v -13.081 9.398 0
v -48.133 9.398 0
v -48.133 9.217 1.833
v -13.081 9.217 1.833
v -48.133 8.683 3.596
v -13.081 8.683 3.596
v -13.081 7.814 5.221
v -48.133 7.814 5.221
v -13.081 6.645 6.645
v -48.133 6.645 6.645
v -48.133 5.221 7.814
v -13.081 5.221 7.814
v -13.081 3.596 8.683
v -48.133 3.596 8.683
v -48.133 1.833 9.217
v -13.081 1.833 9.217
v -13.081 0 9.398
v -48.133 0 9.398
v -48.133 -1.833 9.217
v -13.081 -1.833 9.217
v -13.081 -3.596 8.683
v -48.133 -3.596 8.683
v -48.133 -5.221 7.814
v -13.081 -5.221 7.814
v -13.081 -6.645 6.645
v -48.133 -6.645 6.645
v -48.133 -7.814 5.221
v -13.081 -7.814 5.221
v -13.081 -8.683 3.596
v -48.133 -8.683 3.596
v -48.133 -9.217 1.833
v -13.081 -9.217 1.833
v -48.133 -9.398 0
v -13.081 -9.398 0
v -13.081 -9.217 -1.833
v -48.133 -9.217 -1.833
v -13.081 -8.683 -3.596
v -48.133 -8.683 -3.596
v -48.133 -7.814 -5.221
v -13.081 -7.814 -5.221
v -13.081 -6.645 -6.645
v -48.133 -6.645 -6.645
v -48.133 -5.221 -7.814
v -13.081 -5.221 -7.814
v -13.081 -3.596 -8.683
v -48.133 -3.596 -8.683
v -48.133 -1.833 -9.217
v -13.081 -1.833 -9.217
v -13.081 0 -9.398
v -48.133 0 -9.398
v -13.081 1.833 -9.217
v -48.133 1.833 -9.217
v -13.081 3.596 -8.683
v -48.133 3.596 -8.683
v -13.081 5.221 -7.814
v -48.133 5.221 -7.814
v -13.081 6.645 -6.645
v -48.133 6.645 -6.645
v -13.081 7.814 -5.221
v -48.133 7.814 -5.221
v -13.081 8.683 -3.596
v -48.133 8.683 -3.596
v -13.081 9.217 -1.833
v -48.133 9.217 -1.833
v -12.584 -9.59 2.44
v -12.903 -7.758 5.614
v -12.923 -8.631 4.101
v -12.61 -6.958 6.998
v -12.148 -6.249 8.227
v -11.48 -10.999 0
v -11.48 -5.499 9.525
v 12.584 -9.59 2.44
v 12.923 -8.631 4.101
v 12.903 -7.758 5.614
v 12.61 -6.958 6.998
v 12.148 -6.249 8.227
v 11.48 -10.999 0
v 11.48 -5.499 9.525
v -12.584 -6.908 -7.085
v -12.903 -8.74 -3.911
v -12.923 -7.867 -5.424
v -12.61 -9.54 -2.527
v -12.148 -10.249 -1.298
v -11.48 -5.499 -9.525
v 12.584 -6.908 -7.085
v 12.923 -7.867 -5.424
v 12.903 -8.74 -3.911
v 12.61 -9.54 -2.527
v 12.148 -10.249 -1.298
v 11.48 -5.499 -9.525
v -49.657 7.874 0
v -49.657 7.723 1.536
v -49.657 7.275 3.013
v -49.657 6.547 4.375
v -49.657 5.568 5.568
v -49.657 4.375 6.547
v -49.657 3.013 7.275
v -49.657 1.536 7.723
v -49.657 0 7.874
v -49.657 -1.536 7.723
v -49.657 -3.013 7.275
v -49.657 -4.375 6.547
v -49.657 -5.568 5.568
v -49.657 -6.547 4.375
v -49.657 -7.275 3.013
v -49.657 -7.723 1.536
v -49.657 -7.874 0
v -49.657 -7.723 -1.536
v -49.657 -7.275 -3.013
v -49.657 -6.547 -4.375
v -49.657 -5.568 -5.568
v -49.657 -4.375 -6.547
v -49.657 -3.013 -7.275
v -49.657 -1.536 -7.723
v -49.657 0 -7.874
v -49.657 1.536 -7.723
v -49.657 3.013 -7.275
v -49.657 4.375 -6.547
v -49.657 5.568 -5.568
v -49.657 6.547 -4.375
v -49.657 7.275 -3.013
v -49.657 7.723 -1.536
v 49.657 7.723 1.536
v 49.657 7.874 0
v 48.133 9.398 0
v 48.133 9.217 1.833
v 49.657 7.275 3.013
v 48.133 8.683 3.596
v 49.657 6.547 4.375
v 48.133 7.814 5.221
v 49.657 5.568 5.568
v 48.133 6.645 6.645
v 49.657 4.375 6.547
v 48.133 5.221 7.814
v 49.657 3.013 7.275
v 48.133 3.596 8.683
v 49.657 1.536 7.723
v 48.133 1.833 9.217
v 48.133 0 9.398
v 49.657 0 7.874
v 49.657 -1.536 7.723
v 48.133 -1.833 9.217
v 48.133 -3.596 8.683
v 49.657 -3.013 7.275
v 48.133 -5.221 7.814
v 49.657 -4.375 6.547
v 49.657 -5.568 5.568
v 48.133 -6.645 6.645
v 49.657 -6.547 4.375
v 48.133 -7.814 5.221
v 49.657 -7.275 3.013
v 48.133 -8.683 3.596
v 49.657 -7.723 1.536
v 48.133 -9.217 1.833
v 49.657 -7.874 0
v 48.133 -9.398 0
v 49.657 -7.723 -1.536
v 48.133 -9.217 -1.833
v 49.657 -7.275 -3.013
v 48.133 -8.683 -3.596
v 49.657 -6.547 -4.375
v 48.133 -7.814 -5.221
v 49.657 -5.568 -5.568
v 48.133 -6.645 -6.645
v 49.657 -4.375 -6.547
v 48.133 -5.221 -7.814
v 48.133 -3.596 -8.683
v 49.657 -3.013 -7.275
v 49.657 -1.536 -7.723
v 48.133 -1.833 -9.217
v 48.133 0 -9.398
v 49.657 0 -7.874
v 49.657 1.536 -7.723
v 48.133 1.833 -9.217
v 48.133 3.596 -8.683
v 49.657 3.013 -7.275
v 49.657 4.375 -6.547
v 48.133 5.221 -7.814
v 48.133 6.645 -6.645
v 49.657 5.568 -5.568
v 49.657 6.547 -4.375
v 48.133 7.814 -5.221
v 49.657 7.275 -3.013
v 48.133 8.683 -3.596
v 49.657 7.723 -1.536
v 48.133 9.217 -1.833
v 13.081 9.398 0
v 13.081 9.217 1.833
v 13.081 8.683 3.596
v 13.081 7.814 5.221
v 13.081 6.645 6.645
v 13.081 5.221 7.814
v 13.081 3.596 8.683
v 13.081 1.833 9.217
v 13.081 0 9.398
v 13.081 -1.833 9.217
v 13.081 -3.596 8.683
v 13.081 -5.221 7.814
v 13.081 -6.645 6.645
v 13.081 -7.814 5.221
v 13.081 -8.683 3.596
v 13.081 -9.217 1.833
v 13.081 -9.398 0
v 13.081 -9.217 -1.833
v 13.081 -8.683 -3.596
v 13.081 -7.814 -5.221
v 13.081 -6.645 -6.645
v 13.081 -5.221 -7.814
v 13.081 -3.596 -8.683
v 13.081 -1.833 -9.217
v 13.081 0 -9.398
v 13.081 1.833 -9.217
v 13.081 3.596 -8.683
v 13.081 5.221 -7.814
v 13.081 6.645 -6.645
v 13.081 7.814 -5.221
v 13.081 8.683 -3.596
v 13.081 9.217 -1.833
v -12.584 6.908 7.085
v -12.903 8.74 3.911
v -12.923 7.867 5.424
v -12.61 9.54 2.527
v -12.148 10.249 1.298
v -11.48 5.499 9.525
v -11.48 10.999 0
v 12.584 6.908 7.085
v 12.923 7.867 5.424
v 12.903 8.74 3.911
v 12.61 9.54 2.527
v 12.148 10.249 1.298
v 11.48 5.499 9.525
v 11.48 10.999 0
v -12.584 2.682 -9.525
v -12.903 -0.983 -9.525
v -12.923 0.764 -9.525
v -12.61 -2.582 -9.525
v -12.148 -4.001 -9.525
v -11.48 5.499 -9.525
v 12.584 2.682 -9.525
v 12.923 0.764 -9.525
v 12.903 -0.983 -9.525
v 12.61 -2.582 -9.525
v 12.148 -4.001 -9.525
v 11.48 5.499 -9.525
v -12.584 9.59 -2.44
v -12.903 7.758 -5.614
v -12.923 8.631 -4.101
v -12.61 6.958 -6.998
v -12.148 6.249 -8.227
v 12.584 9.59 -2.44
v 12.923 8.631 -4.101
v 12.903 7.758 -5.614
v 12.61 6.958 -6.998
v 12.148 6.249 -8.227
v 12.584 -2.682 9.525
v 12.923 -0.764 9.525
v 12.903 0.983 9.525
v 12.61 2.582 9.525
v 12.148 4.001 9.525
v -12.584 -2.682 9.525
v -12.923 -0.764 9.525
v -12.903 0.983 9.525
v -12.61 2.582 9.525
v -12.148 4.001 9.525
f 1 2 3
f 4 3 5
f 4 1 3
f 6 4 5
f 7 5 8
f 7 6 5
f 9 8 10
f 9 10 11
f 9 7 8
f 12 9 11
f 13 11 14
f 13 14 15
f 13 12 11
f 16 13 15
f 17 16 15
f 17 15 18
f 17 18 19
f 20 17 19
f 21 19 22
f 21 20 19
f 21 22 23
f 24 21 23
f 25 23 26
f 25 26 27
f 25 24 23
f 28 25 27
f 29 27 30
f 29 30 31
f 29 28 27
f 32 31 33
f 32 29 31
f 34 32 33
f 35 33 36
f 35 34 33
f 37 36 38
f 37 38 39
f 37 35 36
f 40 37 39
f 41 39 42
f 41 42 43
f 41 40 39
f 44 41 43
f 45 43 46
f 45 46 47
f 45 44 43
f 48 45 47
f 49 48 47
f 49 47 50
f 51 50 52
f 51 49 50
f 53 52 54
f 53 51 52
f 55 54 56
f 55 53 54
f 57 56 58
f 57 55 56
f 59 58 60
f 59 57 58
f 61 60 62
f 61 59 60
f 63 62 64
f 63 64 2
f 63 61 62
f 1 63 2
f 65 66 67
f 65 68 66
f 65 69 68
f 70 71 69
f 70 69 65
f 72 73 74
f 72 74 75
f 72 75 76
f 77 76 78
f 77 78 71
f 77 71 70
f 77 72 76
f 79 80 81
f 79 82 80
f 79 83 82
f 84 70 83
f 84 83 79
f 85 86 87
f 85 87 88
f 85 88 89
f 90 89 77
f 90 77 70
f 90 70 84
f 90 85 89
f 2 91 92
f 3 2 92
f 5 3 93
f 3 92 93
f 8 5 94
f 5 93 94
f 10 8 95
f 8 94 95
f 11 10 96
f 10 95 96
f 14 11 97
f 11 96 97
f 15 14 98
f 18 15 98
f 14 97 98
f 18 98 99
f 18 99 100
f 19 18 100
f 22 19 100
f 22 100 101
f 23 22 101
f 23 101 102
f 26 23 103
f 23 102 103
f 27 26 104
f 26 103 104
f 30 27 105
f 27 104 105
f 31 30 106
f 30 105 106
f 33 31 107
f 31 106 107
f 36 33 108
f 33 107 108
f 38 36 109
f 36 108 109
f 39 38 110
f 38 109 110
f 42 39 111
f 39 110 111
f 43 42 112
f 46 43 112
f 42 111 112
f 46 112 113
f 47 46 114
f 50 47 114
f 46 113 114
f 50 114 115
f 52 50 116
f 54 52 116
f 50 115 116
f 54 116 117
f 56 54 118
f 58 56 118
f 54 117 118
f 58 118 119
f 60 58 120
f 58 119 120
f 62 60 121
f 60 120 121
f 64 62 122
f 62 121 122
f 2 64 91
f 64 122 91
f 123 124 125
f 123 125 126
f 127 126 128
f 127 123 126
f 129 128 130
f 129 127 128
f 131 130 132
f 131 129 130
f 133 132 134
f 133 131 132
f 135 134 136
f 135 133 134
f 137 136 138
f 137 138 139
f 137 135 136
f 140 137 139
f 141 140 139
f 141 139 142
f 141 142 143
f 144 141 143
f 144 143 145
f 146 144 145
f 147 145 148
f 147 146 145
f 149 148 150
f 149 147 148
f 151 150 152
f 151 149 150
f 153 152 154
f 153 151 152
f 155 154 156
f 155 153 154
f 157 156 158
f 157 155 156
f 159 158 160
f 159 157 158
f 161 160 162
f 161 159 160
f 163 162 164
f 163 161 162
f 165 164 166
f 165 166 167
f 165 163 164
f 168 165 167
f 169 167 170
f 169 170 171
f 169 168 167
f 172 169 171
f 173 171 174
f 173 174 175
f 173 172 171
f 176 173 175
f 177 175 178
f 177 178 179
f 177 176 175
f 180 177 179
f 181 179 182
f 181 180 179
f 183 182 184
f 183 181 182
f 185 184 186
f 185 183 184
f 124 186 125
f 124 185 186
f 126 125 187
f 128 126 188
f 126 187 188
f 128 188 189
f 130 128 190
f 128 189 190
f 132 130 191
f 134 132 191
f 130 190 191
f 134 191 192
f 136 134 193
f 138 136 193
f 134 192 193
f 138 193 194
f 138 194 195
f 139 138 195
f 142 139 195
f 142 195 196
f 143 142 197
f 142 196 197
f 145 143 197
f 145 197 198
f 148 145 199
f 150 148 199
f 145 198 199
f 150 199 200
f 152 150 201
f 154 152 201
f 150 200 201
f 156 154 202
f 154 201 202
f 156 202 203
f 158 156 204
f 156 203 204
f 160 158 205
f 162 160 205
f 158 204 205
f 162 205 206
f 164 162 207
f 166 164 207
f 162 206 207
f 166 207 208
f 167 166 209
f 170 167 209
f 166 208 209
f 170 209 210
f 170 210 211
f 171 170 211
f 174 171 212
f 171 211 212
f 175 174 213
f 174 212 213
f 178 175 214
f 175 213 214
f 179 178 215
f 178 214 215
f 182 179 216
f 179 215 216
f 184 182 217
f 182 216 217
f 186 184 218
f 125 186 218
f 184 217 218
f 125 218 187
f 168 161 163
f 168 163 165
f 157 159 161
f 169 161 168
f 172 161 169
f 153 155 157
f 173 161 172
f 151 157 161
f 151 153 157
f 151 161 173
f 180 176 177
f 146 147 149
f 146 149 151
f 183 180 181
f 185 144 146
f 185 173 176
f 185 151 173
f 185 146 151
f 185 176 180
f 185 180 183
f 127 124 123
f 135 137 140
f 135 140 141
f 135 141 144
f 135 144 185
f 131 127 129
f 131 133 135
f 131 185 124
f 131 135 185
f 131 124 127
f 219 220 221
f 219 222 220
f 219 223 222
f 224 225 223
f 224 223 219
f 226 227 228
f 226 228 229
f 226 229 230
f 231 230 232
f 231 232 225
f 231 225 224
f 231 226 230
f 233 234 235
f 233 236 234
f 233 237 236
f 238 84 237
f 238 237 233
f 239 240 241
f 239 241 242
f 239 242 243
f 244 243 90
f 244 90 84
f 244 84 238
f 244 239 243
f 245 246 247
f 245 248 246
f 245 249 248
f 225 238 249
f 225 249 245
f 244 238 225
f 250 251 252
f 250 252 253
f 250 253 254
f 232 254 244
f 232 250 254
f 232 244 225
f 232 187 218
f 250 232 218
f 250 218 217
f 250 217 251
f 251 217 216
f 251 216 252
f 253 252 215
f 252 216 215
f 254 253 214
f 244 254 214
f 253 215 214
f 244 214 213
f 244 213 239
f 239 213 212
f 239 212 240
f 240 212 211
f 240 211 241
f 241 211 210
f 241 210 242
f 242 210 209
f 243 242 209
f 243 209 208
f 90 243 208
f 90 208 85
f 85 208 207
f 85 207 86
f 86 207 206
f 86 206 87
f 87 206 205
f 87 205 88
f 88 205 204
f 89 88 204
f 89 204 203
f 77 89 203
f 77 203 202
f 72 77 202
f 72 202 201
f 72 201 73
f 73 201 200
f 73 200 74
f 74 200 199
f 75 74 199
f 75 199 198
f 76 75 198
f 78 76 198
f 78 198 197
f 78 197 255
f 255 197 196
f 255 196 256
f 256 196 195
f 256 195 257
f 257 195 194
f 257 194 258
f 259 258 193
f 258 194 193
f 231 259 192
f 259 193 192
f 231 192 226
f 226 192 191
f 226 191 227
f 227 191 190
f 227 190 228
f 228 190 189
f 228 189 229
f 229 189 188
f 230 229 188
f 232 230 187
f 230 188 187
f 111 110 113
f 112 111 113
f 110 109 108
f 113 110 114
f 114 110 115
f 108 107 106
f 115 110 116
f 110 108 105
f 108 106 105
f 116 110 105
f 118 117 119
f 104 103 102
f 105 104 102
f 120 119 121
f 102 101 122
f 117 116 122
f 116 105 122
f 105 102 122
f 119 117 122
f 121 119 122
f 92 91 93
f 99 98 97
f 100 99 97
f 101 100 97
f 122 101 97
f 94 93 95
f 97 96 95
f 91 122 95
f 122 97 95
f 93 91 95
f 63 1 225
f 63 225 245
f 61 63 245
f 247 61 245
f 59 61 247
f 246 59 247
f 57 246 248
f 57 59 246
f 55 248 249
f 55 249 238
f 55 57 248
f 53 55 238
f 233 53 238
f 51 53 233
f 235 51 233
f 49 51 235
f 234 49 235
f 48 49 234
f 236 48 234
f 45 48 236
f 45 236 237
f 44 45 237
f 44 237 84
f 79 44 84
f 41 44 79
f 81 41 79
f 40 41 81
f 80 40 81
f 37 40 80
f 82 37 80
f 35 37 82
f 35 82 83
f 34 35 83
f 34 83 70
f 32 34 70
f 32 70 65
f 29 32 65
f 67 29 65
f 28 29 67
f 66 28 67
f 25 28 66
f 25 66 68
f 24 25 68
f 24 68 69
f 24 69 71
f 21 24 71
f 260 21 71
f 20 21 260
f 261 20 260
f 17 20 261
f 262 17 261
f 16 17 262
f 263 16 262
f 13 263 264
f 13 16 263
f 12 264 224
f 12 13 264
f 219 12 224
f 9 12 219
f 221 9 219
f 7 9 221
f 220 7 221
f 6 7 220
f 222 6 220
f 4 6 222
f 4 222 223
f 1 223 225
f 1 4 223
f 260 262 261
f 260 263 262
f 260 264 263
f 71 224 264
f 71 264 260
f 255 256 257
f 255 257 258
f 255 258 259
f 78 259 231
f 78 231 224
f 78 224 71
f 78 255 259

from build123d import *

# Parameters (mm, degrees)
F1_DEPTH = 13.081
F2_R     = 9.398
F3_DEPTH = 36.576
F4_SIZE  = 1.524


with BuildPart() as f1:
    # F0 (on Right) → F1 (new body)
    with BuildSketch(Plane.YZ):
        Polygon((5.499261, -9.525), (10.998523, 0), (5.499261, 9.525), (-5.499261, 9.525), (-10.998523, 0), (-5.499261, -9.525), align=None)
    extrude(amount=F1_DEPTH)

    # F2 (on face) → F3 (join)
    with BuildSketch(Plane.YZ.offset(13.081)):
        Circle(F2_R)
    extrude(amount=F3_DEPTH)

    # F4
    f4_edges = [f1.edges().sort_by_distance(p)[0] for p in [
        (49.657, -9.398, 0),
    ]]
    chamfer(f4_edges, length=F4_SIZE)

    # F5 (on Top) → F6 (revolve, cut)
    with BuildSketch(Plane.XY):
        Polygon((13.081, 9.398), (13.081, 11.43), (11.049, 11.43), align=None)
    revolve(axis=Axis((19.661747, 0, 0), (-1, 0, 0)), mode=Mode.SUBTRACT)

    # F7: F1 across face


with BuildPart() as f1_1:
    add(f1.part)
    add(f1.part.mirror(Plane(origin=(0, 0, 0), x_dir=(0, 1, 0), z_dir=(-1, 0, 0))))


solid = f1_1.part
